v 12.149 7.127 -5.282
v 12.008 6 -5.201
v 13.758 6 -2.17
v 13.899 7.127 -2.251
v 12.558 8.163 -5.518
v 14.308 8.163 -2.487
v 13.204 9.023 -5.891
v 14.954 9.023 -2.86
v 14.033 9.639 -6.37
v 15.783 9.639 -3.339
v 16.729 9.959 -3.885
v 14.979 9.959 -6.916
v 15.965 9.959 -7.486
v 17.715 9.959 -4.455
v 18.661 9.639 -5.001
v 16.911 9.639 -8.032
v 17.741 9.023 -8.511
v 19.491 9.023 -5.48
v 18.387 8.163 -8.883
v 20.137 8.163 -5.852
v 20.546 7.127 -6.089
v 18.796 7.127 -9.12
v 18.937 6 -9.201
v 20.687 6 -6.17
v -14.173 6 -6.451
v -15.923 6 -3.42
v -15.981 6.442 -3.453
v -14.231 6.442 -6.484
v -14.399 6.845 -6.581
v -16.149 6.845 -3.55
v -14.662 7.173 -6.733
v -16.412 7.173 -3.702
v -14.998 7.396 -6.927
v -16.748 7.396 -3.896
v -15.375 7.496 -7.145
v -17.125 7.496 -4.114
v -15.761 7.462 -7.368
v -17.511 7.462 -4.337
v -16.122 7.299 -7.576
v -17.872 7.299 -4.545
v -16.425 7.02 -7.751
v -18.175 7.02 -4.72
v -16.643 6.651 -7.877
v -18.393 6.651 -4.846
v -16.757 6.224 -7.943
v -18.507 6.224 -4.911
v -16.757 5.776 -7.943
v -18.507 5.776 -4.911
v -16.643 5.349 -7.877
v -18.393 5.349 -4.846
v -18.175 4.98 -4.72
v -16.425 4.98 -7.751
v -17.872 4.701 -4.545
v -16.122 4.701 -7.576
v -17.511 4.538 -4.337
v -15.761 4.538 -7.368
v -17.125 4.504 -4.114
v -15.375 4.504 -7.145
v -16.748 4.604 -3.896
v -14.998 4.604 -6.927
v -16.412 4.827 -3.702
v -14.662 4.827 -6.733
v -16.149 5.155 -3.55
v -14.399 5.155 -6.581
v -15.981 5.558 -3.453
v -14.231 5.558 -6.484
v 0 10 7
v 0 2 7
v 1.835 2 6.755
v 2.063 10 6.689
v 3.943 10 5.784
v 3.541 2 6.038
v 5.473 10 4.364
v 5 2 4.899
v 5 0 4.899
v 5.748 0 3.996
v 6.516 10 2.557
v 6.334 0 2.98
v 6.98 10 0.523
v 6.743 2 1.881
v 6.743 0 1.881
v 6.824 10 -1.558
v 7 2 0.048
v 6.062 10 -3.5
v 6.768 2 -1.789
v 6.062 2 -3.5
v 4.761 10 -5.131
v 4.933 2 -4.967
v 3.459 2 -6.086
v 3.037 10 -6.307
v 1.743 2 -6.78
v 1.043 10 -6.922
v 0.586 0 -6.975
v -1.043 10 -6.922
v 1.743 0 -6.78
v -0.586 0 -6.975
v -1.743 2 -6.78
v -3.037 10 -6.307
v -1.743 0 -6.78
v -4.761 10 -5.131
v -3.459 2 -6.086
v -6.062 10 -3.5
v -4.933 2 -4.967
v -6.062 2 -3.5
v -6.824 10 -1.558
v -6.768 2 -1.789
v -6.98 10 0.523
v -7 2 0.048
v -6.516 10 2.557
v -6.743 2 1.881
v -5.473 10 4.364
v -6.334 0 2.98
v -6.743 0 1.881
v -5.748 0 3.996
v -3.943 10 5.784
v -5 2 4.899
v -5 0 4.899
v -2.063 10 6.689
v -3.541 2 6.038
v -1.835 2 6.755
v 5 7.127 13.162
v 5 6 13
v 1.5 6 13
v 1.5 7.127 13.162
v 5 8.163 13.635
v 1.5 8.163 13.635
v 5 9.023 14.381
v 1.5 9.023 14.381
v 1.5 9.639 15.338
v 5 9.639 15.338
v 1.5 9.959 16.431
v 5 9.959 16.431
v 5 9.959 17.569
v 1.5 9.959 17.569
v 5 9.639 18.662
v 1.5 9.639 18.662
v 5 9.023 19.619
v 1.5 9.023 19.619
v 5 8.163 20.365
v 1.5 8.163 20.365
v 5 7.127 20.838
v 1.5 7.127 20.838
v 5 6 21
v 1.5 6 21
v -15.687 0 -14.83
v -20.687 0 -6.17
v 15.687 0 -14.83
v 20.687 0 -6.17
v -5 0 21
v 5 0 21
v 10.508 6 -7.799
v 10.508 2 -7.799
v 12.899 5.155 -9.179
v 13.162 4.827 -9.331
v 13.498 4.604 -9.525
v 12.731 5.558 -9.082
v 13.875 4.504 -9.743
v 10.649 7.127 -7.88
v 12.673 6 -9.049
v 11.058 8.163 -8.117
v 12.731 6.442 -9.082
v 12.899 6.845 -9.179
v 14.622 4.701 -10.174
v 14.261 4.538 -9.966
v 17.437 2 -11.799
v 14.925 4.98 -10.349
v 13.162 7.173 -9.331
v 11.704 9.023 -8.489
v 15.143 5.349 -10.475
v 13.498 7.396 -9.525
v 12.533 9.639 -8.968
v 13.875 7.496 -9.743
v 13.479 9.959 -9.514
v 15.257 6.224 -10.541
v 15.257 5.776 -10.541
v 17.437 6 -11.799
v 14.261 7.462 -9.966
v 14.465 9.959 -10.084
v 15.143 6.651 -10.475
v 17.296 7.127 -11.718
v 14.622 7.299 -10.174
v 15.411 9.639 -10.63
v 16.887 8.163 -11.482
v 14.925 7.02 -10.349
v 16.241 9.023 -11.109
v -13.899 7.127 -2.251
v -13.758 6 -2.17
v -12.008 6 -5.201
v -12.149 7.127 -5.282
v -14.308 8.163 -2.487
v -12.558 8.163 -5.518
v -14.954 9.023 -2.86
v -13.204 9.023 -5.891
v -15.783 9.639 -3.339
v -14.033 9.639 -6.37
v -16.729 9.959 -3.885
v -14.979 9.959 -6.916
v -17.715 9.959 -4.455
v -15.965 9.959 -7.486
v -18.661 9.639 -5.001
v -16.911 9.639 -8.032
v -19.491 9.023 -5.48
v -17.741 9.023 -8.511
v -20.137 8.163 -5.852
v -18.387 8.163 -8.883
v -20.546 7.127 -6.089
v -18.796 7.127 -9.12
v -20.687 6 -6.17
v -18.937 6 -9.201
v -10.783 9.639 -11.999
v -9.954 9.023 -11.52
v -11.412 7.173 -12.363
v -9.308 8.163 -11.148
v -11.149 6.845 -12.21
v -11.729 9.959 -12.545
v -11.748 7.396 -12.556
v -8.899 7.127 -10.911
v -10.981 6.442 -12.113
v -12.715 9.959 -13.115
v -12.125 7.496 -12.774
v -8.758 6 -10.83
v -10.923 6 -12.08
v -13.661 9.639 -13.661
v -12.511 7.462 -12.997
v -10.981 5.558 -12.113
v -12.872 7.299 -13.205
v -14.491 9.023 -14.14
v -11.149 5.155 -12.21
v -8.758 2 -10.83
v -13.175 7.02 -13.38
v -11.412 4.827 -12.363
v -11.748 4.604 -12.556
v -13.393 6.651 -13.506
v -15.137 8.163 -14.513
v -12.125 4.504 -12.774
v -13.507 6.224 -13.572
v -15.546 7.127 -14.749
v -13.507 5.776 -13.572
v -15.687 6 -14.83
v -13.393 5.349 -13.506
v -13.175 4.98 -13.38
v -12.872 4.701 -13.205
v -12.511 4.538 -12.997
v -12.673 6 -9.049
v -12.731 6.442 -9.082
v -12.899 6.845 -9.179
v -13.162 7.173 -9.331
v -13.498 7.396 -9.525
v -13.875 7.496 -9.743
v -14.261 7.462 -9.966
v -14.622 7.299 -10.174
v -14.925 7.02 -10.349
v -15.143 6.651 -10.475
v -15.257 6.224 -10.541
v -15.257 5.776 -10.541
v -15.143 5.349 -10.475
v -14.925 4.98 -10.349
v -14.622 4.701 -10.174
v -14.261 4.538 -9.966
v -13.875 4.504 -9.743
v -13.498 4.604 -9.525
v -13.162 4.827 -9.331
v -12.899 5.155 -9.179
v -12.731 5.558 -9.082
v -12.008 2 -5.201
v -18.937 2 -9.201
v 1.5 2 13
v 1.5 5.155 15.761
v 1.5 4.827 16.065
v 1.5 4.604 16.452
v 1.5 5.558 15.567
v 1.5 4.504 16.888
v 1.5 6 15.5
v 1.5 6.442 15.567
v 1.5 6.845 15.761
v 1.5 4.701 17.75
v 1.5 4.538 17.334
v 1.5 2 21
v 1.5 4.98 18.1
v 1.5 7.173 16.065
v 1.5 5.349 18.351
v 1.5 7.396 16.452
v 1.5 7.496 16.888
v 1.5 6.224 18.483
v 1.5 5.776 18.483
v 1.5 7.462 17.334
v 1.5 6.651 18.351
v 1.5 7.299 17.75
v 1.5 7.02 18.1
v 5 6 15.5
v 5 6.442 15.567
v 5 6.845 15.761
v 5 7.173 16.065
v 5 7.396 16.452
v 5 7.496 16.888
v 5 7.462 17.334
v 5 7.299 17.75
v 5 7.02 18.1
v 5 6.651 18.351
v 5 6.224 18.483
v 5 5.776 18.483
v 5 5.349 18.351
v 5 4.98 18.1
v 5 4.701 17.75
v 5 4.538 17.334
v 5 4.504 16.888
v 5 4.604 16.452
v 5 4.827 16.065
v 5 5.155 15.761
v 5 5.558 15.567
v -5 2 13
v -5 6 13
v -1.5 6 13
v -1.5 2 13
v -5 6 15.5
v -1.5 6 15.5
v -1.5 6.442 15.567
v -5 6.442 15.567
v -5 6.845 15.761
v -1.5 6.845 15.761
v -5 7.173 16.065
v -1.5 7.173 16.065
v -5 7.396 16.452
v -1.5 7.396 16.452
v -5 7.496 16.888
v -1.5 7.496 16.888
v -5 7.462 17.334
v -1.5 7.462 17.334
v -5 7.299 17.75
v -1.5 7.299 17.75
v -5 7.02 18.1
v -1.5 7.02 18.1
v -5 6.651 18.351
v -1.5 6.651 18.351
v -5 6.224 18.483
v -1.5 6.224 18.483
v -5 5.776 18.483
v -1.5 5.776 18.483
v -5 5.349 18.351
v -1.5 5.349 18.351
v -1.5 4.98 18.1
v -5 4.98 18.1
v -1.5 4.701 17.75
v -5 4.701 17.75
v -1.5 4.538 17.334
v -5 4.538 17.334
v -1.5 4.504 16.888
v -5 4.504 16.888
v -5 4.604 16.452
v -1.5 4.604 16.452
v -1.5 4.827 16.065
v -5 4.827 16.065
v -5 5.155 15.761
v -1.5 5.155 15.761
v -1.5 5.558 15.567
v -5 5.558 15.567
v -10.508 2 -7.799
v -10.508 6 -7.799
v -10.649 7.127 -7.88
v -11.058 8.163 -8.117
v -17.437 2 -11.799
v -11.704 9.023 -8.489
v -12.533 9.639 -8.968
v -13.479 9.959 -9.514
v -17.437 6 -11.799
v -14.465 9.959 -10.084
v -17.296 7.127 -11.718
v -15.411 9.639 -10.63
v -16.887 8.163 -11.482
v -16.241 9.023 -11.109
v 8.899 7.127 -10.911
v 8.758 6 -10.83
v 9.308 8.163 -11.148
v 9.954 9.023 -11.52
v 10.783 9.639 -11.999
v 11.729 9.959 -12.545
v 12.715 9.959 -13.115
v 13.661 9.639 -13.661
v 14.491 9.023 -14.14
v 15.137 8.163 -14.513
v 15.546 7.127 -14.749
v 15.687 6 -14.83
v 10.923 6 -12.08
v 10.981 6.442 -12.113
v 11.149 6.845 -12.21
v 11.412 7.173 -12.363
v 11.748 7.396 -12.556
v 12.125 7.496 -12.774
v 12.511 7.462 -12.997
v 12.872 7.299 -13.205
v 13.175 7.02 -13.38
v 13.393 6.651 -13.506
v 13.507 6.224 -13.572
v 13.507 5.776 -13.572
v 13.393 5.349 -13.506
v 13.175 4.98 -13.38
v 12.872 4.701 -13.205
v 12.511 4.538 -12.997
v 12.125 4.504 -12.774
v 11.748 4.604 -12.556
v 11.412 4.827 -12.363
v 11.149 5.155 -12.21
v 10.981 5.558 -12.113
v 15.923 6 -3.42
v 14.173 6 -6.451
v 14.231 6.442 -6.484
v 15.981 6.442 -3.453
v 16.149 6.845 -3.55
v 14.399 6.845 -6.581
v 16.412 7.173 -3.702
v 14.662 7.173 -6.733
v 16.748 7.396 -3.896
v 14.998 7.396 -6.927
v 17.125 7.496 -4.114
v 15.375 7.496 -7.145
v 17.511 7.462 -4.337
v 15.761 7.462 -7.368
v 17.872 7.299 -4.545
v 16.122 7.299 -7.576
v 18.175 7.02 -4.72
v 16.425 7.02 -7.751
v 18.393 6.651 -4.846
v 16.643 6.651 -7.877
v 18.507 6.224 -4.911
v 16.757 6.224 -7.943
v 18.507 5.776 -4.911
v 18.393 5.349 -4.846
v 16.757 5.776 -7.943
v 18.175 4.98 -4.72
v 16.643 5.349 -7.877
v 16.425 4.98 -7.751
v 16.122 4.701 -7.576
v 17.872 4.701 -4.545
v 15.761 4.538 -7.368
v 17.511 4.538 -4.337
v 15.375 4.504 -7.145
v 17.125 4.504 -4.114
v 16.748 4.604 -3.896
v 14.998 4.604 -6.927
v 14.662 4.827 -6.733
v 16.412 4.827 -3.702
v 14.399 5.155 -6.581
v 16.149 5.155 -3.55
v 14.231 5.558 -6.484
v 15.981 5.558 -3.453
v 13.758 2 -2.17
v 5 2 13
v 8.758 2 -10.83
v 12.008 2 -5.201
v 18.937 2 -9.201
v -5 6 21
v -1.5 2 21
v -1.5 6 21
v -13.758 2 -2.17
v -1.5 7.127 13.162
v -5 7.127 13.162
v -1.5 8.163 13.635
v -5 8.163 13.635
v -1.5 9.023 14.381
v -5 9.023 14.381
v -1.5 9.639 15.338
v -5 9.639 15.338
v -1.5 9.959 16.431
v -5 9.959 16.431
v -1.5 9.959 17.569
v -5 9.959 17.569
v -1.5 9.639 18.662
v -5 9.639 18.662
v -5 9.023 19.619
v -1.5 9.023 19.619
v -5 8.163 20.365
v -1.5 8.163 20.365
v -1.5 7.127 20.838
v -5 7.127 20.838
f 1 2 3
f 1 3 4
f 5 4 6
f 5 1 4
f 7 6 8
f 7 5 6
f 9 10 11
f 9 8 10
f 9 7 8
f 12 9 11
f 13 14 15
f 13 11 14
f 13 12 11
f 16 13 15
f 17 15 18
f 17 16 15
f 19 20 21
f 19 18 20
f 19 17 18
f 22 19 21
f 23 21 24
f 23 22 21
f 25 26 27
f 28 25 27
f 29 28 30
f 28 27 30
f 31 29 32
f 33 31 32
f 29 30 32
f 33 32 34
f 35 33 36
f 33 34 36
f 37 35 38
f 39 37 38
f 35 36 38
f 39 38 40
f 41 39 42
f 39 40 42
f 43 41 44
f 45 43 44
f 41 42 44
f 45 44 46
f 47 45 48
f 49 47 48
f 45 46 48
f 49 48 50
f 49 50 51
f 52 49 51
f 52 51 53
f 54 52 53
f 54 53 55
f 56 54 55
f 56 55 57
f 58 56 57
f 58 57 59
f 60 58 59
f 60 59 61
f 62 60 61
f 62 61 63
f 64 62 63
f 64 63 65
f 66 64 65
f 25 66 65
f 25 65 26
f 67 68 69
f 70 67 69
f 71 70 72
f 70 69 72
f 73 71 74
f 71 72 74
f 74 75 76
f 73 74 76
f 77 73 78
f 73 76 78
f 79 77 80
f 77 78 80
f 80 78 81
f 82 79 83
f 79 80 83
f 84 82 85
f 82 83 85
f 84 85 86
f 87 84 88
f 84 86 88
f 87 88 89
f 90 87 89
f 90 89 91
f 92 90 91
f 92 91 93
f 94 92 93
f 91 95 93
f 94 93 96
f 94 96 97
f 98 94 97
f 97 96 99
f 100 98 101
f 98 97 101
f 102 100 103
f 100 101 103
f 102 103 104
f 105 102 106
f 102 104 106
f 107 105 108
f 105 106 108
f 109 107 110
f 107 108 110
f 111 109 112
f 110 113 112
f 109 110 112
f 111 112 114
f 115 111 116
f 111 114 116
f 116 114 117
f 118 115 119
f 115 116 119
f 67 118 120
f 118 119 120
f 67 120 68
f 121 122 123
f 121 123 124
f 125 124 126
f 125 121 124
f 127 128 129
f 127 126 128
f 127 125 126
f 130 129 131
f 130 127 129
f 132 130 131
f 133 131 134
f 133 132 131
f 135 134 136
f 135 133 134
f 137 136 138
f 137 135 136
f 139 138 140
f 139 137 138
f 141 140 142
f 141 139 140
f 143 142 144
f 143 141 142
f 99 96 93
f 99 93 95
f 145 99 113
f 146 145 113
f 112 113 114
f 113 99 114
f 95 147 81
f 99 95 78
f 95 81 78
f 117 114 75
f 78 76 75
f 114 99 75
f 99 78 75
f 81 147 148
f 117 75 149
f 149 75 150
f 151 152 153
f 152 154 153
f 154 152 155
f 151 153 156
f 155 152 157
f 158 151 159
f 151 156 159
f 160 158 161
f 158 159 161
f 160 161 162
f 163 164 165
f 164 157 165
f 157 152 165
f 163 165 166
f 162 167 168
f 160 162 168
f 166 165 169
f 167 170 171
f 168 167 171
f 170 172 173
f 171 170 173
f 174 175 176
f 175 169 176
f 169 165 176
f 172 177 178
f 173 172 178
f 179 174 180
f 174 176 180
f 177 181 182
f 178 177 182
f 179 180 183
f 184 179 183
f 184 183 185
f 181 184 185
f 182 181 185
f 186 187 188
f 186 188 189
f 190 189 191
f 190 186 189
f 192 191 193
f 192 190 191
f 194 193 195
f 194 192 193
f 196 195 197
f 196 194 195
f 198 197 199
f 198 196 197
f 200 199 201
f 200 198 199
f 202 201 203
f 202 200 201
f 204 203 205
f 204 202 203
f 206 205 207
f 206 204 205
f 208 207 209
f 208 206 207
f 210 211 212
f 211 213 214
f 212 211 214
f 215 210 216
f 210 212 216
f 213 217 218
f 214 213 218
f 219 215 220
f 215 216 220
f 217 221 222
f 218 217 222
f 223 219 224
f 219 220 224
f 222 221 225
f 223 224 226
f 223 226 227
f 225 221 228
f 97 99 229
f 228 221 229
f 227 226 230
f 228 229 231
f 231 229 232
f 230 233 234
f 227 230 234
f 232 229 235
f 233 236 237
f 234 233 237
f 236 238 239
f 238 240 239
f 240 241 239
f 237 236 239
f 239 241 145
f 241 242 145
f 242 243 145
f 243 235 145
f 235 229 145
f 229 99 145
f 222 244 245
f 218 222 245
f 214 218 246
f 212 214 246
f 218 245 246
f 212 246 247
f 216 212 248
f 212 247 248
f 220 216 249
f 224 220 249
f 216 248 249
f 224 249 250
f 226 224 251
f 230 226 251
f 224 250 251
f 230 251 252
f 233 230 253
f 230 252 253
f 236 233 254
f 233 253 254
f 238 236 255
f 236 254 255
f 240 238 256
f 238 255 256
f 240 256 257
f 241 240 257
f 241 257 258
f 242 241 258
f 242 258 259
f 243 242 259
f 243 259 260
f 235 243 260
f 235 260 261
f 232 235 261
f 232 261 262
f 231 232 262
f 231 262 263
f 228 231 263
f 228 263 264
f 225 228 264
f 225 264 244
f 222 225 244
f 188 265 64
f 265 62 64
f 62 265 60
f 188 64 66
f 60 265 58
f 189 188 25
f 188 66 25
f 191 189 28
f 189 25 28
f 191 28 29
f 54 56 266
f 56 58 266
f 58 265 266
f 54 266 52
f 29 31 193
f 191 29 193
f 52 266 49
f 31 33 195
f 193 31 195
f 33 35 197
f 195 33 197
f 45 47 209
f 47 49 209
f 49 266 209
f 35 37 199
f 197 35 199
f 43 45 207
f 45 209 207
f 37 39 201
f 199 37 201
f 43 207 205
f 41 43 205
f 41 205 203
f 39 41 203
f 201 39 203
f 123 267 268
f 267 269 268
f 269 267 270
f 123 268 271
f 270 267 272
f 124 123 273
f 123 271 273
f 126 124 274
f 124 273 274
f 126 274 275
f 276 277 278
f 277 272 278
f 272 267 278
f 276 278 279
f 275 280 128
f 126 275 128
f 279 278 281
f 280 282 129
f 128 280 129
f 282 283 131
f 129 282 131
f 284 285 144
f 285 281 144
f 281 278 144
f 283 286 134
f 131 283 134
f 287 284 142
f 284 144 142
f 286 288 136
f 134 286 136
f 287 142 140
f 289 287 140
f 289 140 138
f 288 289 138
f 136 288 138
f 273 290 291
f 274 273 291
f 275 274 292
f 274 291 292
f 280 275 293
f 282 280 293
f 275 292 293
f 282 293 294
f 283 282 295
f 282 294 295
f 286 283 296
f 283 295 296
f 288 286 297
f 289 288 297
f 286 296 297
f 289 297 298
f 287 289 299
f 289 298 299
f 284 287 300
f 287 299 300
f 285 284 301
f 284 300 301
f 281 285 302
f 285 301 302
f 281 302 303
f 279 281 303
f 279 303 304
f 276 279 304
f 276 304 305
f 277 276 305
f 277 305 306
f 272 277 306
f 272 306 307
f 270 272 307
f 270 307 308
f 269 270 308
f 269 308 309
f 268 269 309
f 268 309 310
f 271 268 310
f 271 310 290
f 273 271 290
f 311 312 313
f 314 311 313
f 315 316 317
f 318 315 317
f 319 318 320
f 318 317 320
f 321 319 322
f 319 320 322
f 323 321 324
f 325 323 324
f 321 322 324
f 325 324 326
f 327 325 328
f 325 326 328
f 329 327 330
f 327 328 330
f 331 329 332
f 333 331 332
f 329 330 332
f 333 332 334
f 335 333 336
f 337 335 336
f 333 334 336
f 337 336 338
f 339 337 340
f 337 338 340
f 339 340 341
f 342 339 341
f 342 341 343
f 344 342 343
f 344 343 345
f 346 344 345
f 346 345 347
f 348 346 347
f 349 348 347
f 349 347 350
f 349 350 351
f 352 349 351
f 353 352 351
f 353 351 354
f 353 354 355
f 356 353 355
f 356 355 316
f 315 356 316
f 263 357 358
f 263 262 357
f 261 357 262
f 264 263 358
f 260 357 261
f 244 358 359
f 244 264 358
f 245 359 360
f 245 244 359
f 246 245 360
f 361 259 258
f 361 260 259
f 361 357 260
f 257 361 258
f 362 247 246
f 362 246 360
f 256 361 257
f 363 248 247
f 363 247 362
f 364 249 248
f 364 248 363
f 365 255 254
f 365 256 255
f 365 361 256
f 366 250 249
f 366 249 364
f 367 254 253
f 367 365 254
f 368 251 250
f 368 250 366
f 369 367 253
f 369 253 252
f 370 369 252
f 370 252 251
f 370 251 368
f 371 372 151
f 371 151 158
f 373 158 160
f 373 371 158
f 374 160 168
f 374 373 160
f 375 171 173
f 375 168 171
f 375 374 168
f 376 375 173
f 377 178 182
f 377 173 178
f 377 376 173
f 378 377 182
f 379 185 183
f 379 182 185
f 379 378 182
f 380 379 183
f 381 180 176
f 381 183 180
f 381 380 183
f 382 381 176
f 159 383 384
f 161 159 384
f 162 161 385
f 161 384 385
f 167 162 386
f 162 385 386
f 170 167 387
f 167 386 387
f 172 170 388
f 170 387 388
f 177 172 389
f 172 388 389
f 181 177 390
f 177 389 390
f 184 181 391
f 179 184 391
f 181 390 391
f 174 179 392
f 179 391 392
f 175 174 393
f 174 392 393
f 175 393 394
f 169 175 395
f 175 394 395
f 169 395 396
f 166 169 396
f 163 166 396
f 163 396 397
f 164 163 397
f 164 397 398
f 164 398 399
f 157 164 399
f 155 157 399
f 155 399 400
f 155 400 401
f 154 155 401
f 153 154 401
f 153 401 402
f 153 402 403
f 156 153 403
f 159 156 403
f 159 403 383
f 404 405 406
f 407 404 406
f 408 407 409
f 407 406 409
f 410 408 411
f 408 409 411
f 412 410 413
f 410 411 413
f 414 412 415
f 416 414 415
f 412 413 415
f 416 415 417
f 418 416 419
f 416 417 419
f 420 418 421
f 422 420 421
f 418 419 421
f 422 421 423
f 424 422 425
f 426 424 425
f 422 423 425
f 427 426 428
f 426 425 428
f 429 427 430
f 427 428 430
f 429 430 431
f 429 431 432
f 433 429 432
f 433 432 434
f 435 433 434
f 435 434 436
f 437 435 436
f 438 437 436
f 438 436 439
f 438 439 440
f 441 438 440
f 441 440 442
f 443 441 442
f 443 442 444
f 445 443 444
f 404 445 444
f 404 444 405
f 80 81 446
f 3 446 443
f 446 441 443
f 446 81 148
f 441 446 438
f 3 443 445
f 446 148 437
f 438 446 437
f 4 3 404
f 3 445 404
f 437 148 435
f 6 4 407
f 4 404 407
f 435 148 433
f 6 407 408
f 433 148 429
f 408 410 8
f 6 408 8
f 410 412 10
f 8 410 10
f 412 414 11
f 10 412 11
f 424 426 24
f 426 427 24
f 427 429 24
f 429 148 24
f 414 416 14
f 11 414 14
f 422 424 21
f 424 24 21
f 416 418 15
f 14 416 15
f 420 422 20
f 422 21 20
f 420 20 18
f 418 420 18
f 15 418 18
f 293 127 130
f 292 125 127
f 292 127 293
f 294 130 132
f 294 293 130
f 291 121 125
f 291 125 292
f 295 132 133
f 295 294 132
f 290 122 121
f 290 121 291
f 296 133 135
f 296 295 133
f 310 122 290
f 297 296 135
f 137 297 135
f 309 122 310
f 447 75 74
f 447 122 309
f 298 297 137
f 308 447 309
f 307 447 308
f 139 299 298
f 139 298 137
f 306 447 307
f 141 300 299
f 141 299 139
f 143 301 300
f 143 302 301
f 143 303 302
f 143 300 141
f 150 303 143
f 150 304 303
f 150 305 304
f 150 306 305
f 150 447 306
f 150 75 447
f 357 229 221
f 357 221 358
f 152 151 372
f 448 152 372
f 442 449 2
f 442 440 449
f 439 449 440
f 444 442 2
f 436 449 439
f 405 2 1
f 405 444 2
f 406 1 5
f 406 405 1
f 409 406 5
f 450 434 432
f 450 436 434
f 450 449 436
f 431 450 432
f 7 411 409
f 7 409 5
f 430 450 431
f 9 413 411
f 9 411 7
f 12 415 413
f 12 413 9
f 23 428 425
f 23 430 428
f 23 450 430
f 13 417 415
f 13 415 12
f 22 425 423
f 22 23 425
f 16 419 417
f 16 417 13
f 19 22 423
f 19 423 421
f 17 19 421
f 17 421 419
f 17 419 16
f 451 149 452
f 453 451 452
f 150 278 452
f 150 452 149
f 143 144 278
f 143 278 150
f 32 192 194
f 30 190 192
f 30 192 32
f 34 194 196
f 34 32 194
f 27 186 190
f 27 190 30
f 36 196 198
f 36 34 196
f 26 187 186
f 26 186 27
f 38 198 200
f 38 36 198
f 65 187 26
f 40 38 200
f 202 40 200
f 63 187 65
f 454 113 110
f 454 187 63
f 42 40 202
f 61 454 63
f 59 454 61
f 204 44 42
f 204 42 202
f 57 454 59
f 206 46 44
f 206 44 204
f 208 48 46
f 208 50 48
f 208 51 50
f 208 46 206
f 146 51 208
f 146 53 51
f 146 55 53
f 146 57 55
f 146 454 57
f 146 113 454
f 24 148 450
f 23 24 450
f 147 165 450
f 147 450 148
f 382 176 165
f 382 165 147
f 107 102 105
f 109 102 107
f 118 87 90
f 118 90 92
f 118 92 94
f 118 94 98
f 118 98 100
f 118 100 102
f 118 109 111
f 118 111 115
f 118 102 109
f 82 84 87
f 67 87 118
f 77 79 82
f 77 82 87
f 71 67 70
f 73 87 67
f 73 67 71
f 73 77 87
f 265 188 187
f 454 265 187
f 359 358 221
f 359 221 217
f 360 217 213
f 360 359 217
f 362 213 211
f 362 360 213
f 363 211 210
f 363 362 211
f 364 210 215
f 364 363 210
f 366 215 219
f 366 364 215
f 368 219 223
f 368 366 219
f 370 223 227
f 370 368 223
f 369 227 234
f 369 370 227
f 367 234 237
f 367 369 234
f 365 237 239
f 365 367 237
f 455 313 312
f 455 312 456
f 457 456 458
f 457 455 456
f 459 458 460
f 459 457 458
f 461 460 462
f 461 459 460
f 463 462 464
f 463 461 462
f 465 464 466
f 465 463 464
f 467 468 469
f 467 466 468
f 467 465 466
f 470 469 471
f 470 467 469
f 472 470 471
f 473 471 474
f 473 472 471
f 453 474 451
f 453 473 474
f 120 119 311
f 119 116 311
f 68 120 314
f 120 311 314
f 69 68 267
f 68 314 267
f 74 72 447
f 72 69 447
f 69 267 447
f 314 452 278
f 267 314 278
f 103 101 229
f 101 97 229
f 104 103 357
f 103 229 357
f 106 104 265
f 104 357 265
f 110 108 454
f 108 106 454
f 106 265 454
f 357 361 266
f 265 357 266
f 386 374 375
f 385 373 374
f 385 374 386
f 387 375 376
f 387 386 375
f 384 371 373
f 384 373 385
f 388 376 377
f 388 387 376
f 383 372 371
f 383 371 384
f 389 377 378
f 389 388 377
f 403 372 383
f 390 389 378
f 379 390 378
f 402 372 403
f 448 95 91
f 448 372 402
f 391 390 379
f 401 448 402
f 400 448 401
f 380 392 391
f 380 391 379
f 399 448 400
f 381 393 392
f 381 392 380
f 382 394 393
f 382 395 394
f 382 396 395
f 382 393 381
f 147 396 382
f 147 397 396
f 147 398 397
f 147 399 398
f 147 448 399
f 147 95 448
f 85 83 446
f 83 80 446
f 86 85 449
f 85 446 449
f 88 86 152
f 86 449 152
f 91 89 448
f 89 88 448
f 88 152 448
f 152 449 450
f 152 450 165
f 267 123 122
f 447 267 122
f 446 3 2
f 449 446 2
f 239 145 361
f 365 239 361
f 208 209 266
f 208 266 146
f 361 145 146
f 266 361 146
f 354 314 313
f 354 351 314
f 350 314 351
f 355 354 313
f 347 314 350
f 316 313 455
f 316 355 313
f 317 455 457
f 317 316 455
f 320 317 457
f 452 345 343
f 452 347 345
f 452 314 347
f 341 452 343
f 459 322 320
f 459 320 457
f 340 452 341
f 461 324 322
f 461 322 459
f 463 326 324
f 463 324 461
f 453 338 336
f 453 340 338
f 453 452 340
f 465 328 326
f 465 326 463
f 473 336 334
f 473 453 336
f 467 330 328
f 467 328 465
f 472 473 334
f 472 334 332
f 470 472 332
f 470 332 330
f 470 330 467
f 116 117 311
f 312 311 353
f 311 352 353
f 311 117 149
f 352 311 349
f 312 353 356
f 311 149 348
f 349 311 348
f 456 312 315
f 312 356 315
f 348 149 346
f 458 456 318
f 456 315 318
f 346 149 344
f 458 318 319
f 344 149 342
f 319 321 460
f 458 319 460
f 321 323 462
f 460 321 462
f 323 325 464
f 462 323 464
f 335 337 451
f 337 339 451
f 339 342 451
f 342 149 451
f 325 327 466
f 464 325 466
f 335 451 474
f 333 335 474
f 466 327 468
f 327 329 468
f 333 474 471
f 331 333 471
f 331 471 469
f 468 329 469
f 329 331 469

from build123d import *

# Parameters (mm, degrees)
SKETCH1_R           = 7
BOSS_EXTRUDE1_DEPTH = 10
SKETCH2_W           = 10
SKETCH2_H           = 21
BOSS_EXTRUDE2_DEPTH = 2
SKETCH3_W           = 3.5
SKETCH3_H           = 8
BOSS_EXTRUDE3_DEPTH = 8
CUT_EXTRUDE1_DEPTH  = 27.172504657
SKETCH5_R           = 1.5
CUT_EXTRUDE2_DEPTH  = 27.172504657
CIRPATTERN1_COUNT   = 3


with BuildPart() as part:
    # Sketch1 → Boss-Extrude1 (new body)
    with BuildSketch(Plane(origin=(0, 0, 0), x_dir=(1, 0, 0), z_dir=(0, 1, 0))):
        with Locations(Location((0, 0, 0), (0, 0, 270))):
            Circle(SKETCH1_R)
    extrude(amount=BOSS_EXTRUDE1_DEPTH)

    # Sketch2 → Boss-Extrude2 (add)
    with BuildSketch(Plane.XZ):
        with Locations((0, 10.5)):
            Rectangle(SKETCH2_W, SKETCH2_H)
    boss_extrude2 = extrude(amount=-BOSS_EXTRUDE2_DEPTH)

    # Sketch3 → Boss-Extrude3 (add)
    with BuildSketch(Plane.XY.offset(21)):
        with Locations((-3.25, 6)):
            Rectangle(SKETCH3_W, SKETCH3_H)
        with Locations((3.25, 6)):
            Rectangle(SKETCH3_W, SKETCH3_H)
    boss_extrude3 = extrude(amount=-BOSS_EXTRUDE3_DEPTH)

    # Sketch4 → Cut-Extrude1 (cut, through all)
    with BuildSketch(Plane(origin=(5, 0, 0), x_dir=(0, 0, -1), z_dir=(1, 0, 0))):
        with BuildLine():
            Line((-21, 6), (-21, 11))
            Line((-21, 11), (-13, 11))
            Line((-13, 11), (-13, 6))
            ThreePointArc((-13, 6), (-17, 10), (-21, 6))
        make_face()
    cut_extrude1 = extrude(amount=-CUT_EXTRUDE1_DEPTH, mode=Mode.SUBTRACT)

    # Sketch5 → Cut-Extrude2 (cut, through all)
    with BuildSketch(Plane(origin=(5, 0, 0), x_dir=(0, 0, -1), z_dir=(1, 0, 0))):
        with Locations((-17, 6)):
            Circle(SKETCH5_R)
    cut_extrude2 = extrude(amount=-CUT_EXTRUDE2_DEPTH, mode=Mode.SUBTRACT)

    # CirPattern1: Boss-Extrude2, Boss-Extrude3, Cut-Extrude1, Cut-Extrude2 ×3 about axis
    cirpattern1_axis = Axis((0, 0, 0), (0, 1, 0))
    add([boss_extrude2.rotate(cirpattern1_axis, i * 360 / CIRPATTERN1_COUNT) for i in range(1, CIRPATTERN1_COUNT)])
    add([boss_extrude3.rotate(cirpattern1_axis, i * 360 / CIRPATTERN1_COUNT) for i in range(1, CIRPATTERN1_COUNT)])
    add([cut_extrude1.rotate(cirpattern1_axis, i * 360 / CIRPATTERN1_COUNT) for i in range(1, CIRPATTERN1_COUNT)], mode=Mode.SUBTRACT)
    add([cut_extrude2.rotate(cirpattern1_axis, i * 360 / CIRPATTERN1_COUNT) for i in range(1, CIRPATTERN1_COUNT)], mode=Mode.SUBTRACT)


solid = part.part
